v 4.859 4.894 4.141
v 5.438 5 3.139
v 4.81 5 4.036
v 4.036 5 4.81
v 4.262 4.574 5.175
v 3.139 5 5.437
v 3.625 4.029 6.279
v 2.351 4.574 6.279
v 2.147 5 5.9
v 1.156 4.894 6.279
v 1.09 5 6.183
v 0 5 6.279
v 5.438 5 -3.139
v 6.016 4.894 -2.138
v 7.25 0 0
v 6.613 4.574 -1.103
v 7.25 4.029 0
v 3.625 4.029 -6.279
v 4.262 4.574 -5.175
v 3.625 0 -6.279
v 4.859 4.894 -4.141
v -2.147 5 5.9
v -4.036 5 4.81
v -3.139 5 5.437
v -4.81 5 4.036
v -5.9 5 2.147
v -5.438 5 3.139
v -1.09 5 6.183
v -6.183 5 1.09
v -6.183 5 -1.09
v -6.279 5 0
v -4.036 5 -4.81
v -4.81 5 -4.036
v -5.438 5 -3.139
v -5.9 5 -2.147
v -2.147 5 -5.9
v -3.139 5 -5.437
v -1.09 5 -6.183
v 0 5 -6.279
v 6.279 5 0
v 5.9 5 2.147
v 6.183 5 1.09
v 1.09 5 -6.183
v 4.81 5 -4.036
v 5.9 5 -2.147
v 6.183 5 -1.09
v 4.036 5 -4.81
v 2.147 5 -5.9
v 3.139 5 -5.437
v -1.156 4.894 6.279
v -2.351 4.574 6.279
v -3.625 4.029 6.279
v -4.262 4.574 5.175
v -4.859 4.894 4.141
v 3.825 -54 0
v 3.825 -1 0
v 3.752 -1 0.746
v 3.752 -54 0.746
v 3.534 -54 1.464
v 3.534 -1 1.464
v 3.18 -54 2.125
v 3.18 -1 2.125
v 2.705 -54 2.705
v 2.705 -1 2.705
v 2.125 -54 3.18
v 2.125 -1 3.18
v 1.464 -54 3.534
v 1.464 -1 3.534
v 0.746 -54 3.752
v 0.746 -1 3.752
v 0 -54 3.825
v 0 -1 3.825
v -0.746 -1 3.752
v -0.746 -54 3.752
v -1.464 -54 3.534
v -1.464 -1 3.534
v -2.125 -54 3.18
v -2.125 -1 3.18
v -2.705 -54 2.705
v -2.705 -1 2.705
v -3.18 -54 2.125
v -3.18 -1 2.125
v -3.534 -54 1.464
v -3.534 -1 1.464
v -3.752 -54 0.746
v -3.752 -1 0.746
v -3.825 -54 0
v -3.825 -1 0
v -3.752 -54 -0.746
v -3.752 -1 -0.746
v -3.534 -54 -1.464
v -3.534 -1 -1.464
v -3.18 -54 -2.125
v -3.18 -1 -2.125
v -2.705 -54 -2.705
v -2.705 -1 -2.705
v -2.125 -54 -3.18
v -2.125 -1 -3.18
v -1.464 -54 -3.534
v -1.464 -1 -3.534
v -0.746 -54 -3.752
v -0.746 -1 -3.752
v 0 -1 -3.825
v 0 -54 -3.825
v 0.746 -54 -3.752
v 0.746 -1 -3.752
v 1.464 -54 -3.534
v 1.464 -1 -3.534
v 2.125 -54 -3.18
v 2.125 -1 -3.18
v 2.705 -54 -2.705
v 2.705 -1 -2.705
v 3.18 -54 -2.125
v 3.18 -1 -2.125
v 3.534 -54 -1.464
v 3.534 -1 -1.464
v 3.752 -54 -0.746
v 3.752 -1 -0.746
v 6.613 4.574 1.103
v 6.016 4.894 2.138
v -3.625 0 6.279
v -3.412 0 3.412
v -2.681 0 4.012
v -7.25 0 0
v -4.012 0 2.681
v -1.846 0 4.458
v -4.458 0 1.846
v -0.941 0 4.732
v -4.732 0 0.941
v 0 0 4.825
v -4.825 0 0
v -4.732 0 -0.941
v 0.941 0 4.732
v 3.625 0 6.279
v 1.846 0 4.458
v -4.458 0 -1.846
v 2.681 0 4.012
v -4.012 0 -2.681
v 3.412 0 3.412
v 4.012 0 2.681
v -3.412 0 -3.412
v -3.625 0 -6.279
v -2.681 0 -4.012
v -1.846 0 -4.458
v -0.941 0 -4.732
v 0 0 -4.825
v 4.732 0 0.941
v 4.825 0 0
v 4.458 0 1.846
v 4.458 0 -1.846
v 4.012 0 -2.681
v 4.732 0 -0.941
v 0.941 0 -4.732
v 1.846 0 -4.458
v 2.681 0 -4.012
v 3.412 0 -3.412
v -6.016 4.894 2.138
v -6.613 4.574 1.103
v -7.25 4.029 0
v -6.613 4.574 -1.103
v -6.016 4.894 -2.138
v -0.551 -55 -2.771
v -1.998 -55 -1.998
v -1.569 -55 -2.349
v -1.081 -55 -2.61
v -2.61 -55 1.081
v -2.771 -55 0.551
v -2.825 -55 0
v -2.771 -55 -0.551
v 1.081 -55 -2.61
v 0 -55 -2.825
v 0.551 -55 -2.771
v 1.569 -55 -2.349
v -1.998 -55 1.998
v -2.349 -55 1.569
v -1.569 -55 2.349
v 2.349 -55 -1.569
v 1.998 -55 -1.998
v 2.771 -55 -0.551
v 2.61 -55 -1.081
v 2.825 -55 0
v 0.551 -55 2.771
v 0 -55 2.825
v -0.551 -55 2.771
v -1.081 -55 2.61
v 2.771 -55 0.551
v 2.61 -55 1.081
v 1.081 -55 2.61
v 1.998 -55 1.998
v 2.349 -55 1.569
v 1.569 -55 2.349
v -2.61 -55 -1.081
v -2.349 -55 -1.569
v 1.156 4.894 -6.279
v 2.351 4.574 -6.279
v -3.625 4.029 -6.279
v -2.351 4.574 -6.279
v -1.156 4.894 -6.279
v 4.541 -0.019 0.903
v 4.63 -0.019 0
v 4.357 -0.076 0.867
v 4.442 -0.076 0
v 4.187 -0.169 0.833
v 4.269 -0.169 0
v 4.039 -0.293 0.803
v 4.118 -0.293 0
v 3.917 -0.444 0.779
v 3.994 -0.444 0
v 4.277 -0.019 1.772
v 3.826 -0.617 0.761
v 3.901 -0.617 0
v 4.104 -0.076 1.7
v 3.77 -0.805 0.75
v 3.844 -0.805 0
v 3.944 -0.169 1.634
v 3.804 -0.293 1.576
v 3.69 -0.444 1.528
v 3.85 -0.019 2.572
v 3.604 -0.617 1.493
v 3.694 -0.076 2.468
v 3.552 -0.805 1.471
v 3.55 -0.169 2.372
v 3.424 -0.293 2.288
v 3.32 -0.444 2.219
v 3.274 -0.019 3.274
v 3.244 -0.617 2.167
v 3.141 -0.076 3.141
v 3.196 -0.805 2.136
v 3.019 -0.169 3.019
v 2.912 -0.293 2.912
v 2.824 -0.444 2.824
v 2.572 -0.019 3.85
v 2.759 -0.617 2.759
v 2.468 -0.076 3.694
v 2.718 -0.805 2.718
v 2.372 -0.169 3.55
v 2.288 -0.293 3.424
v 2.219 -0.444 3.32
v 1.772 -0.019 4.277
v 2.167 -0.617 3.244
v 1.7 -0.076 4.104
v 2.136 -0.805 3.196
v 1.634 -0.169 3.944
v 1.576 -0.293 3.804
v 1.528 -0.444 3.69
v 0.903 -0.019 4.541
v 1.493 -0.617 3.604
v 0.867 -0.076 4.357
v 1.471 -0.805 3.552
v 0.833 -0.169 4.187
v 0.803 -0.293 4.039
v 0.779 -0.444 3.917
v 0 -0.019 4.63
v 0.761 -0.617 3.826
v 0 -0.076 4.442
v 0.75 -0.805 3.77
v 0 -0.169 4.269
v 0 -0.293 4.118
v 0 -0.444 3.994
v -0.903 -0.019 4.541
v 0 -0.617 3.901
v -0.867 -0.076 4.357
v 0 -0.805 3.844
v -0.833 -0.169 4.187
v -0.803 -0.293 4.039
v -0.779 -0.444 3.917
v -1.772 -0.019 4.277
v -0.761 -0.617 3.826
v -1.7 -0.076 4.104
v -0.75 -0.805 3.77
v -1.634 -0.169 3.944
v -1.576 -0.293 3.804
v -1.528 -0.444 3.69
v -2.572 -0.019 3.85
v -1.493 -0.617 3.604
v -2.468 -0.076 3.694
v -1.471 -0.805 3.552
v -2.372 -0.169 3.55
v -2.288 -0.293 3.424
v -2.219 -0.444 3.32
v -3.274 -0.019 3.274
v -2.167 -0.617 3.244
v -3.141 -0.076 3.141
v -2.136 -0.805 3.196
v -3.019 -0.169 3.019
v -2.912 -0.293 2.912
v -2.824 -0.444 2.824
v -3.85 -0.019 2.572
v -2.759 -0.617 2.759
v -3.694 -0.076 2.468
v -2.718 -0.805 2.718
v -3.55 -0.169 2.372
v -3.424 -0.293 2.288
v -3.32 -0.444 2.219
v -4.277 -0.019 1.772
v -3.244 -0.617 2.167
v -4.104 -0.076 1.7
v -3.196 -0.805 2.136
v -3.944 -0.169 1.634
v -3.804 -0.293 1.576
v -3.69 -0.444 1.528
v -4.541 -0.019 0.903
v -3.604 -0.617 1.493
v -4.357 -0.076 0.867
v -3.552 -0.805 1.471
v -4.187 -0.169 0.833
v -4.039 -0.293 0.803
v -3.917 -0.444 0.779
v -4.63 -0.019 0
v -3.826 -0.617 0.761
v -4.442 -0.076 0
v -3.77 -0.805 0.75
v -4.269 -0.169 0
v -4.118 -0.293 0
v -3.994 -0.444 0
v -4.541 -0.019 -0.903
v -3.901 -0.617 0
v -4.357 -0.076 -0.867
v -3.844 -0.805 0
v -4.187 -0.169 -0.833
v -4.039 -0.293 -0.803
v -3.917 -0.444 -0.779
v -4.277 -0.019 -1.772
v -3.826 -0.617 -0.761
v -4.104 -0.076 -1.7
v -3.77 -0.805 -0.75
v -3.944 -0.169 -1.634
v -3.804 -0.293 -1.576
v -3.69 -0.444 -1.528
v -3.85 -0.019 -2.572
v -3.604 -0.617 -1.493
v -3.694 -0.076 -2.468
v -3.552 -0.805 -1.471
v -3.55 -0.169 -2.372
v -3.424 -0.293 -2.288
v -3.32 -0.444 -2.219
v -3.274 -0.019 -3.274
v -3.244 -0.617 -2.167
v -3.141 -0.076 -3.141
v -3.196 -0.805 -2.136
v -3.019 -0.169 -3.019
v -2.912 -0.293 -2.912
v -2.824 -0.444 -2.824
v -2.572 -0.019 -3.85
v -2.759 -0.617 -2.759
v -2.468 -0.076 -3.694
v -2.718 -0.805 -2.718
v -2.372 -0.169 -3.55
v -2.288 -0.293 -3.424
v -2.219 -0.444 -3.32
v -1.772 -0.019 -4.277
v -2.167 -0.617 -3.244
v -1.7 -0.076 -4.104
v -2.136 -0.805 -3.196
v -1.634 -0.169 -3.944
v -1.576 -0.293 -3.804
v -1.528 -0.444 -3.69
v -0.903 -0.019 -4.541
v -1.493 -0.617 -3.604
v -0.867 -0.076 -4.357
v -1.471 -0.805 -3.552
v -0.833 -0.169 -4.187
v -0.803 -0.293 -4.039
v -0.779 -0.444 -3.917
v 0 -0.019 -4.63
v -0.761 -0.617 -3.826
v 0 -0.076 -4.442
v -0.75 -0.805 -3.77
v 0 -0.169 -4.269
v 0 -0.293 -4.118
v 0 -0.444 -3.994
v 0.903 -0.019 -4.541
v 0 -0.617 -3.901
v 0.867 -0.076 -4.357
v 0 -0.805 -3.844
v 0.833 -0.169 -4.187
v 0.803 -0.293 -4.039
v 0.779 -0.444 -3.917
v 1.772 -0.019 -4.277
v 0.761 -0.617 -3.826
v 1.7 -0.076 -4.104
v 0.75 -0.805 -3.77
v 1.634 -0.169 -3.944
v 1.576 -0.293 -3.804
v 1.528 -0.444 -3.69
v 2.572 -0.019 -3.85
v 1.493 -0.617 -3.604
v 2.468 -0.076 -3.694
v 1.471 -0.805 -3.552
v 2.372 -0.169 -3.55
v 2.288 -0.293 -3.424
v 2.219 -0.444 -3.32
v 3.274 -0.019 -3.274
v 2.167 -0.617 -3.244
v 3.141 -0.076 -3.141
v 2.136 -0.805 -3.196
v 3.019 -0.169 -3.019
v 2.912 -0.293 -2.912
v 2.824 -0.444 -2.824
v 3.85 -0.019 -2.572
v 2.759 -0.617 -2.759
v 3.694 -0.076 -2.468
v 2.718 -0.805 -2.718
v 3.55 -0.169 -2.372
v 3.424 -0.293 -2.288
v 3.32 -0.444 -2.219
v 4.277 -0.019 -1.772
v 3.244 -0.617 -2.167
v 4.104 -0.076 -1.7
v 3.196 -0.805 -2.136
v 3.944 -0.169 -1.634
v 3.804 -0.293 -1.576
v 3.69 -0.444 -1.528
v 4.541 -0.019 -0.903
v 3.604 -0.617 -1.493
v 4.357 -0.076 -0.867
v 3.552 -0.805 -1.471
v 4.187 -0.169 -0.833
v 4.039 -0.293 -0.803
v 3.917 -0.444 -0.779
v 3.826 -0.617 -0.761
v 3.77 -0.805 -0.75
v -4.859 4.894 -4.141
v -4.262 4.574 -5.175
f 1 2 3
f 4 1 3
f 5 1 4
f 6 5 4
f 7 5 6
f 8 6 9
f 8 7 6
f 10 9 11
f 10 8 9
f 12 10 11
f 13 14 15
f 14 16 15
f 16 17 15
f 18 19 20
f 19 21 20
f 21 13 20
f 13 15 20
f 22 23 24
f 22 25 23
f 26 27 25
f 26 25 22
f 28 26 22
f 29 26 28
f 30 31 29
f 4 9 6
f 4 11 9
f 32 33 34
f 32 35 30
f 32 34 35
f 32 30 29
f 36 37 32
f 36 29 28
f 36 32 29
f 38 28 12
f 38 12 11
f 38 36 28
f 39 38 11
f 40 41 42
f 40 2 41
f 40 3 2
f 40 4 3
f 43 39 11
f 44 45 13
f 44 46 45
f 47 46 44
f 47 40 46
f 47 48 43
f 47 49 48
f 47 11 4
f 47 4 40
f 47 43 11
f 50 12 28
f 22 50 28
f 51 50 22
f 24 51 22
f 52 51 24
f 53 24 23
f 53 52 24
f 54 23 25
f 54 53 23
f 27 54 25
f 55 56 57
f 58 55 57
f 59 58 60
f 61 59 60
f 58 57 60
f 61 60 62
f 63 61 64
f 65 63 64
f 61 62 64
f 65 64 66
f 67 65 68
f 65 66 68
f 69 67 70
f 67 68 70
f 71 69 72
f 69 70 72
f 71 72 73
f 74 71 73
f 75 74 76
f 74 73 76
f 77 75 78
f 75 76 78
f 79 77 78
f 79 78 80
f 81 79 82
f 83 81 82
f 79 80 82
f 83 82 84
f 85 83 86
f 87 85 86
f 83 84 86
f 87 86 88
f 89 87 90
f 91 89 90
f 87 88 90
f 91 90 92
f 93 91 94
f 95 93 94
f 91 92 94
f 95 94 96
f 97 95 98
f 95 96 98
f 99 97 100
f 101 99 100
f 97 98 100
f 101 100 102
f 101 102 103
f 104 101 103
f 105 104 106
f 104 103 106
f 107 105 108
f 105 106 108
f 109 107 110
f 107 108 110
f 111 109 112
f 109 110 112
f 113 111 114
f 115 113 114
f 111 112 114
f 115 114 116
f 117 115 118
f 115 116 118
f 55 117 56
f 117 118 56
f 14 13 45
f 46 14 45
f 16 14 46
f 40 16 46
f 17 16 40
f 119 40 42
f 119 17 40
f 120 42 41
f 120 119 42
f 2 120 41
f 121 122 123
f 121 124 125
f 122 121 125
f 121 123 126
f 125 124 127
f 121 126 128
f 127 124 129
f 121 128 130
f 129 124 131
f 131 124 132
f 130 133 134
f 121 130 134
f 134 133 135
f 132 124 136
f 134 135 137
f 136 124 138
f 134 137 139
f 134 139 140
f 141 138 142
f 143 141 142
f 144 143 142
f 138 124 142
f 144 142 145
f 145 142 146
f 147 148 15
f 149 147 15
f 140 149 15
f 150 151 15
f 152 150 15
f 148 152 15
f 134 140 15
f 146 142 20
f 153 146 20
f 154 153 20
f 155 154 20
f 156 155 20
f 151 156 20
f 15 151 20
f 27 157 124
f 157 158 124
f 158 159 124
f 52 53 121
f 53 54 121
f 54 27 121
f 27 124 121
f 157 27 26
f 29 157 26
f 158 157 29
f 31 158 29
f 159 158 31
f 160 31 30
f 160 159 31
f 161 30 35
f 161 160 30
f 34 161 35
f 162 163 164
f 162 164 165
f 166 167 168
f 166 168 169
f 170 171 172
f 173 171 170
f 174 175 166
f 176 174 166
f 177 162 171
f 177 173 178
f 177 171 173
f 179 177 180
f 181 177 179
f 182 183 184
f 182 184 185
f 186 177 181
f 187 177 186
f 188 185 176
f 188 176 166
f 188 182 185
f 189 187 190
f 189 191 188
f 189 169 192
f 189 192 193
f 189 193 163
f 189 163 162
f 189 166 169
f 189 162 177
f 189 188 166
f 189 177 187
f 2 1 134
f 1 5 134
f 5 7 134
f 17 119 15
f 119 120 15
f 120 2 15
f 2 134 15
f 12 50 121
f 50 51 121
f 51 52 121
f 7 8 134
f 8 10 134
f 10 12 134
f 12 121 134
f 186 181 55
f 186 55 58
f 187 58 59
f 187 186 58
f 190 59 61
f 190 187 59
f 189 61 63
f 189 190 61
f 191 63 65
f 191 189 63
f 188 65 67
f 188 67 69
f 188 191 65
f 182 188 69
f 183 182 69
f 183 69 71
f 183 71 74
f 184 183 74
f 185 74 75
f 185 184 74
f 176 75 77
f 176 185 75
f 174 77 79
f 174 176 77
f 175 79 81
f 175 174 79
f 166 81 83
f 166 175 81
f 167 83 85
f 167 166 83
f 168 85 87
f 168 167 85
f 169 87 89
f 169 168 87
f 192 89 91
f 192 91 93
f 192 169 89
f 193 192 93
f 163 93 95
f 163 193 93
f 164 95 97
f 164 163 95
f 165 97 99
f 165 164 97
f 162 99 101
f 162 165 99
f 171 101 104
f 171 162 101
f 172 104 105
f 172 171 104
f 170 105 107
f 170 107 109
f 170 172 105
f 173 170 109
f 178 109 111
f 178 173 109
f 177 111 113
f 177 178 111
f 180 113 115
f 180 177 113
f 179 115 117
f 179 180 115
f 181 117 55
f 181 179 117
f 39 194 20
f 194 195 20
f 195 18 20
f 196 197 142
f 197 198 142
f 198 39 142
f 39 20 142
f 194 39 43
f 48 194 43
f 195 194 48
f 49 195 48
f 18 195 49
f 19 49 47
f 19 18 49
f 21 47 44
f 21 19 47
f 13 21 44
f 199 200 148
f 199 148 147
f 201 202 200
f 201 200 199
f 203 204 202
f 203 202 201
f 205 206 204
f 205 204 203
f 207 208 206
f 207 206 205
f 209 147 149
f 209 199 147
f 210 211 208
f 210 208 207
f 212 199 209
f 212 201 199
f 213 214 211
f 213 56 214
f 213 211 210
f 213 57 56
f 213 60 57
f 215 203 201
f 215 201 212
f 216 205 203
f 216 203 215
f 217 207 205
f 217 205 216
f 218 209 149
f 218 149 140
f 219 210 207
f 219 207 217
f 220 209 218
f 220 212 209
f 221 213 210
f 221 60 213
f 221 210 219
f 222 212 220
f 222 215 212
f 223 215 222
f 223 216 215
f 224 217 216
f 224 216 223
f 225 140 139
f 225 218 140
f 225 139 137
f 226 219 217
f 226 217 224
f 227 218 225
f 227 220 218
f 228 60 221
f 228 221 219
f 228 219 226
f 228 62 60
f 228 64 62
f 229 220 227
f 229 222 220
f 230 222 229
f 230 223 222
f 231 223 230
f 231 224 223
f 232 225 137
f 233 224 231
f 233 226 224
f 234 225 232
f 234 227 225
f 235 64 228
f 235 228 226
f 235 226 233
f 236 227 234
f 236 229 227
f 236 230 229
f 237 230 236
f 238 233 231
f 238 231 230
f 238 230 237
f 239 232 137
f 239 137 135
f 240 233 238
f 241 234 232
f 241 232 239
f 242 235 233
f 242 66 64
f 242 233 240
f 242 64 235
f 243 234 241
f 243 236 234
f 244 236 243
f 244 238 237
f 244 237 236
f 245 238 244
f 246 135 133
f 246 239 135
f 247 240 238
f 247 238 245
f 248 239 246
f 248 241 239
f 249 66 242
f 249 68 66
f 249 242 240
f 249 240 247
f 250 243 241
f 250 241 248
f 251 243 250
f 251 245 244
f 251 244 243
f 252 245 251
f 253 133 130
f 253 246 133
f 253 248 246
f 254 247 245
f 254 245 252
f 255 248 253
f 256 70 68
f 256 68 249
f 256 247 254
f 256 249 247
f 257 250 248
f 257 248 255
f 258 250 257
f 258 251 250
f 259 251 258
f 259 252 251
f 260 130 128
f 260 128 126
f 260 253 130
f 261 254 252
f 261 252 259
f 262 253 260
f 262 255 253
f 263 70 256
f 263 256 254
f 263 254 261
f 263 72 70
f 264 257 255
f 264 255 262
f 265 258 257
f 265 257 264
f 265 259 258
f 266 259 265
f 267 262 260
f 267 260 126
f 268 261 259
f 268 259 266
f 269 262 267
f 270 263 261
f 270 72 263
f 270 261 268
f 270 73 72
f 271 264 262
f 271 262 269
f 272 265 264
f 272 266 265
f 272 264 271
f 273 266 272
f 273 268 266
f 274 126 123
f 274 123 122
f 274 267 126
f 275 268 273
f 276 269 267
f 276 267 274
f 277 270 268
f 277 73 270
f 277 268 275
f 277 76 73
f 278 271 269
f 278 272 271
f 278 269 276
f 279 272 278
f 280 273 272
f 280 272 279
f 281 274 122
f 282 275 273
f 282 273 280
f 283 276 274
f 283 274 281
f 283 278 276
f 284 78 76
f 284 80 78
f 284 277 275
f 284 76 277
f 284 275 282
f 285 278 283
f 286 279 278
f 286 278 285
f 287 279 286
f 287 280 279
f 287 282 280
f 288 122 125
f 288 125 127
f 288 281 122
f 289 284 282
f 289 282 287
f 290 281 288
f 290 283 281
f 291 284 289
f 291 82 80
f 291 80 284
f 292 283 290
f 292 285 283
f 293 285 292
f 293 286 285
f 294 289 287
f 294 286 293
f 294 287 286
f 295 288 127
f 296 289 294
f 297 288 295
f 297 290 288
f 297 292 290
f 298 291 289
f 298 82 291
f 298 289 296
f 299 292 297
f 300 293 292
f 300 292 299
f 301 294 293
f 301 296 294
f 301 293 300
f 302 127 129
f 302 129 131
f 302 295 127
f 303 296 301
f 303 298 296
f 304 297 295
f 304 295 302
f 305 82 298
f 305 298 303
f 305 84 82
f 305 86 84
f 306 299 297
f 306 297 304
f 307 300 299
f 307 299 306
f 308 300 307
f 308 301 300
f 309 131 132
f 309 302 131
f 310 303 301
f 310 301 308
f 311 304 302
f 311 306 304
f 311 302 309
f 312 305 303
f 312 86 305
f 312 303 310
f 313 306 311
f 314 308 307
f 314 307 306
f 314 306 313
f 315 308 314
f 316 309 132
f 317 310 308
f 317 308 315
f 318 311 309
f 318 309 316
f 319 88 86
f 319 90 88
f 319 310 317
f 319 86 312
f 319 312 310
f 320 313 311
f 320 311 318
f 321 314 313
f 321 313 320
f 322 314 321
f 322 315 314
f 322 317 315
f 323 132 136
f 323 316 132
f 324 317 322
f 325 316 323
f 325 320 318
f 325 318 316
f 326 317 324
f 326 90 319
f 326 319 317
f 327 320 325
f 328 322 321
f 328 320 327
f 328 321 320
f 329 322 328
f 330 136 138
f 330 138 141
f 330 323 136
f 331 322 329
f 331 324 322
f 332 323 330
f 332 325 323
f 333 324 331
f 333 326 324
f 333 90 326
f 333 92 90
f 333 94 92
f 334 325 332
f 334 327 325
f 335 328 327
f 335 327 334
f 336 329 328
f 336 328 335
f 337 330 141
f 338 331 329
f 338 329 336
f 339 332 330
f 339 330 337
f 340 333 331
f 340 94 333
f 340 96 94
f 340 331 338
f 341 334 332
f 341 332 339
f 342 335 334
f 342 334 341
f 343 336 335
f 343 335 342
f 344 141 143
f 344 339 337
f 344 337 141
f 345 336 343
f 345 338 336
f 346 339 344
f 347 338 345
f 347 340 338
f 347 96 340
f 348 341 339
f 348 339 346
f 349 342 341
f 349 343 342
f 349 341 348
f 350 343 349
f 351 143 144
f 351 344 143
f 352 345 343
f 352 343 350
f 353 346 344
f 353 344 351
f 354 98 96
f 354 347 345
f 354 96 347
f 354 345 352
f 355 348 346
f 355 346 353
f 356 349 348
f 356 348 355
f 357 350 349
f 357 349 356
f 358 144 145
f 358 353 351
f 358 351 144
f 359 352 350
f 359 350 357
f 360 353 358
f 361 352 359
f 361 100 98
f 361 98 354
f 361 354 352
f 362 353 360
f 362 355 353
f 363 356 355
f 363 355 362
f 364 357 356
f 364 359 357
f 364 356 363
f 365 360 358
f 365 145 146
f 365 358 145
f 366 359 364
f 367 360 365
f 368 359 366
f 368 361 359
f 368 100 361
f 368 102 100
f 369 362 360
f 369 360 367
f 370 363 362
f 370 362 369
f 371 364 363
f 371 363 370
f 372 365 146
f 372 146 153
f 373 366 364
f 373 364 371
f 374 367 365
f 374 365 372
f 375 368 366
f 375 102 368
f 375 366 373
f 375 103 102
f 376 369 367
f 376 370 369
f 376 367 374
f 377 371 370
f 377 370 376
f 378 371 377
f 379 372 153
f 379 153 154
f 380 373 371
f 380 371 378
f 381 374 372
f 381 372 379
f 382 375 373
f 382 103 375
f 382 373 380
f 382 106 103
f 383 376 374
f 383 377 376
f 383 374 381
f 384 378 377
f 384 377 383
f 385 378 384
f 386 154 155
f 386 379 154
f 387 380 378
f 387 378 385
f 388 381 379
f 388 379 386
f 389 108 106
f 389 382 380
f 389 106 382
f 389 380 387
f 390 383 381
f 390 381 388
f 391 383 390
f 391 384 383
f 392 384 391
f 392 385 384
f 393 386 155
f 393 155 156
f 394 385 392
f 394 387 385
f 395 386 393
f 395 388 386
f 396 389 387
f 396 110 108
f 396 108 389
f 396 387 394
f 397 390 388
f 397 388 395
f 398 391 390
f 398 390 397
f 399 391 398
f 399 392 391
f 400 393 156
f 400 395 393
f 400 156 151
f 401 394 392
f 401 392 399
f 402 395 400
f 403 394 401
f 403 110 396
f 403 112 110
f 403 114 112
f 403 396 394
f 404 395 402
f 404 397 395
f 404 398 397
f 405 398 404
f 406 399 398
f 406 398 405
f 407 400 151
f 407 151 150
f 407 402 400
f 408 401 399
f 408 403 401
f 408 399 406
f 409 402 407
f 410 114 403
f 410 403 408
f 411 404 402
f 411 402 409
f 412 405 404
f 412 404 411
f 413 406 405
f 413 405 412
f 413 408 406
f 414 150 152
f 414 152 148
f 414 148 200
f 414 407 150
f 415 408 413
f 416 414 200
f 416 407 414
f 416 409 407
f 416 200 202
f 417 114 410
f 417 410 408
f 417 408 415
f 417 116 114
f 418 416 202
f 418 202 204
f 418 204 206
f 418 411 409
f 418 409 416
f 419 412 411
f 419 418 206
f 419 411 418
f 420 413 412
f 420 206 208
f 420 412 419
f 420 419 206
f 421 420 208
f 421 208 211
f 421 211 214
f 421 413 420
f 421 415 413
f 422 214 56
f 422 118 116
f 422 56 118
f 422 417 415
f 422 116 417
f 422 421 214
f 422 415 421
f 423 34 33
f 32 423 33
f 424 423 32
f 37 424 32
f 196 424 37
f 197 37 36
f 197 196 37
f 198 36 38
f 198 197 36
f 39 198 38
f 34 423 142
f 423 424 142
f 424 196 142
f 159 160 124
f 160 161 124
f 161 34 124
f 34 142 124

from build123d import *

# Parameters (mm, degrees)
EXTRUDE_1_DEPTH     = 5
SKETCH_8_OUTSIDE_W  = 22.464
SKETCH_8_OUTSIDE_H  = 20.522
SKETCH_8_OUTSIDE_R  = 6.278684177
CUT_EXTRUDE_1_DEPTH = 1
CUT_EXTRUDE_1_TAPER = 45
SKETCH_9_R          = 3.825
BOLT_LENGTH_DEPTH   = 55
FILLET_1_R          = 1
CHAMFER_1_SIZE      = 1


with BuildPart() as part:
    # Эскиз6 → Бобышка-Вытянуть1 (new body)
    with BuildSketch(Plane(origin=(0, 0, 0), x_dir=(1, 0, 0), z_dir=(0, 1, 0))):
        Polygon((7.25, 0), (3.625, 6.278684177), (-3.625, 6.278684177), (-7.25, 0), (-3.625, -6.278684177), (3.625, -6.278684177), align=None)
    extrude(amount=EXTRUDE_1_DEPTH)

    # Эскиз8 outside → Вырез-Вытянуть1 (cut)
    with BuildSketch(Plane(origin=(0, 5, 0), x_dir=(1, 0, 0), z_dir=(0, 1, 0))):
        Rectangle(SKETCH_8_OUTSIDE_W, SKETCH_8_OUTSIDE_H)
        Circle(SKETCH_8_OUTSIDE_R, mode=Mode.SUBTRACT)
    extrude(amount=-CUT_EXTRUDE_1_DEPTH, taper=CUT_EXTRUDE_1_TAPER, mode=Mode.SUBTRACT)

    # Эскиз9 → bolt length (add)
    with BuildSketch(Plane.XZ):
        Circle(SKETCH_9_R)
    extrude(amount=BOLT_LENGTH_DEPTH)

    # Скругление1
    fillet_1_edges = [part.edges().sort_by_distance(p)[0] for p in [
        (-3.825, 0, 0),
    ]]
    fillet(fillet_1_edges, radius=FILLET_1_R)

    # Фаска1
    chamfer_1_edges = [part.edges().sort_by_distance(p)[0] for p in [
        (-3.825, -55, 0),
    ]]
    chamfer(chamfer_1_edges, length=CHAMFER_1_SIZE)


solid = part.part
